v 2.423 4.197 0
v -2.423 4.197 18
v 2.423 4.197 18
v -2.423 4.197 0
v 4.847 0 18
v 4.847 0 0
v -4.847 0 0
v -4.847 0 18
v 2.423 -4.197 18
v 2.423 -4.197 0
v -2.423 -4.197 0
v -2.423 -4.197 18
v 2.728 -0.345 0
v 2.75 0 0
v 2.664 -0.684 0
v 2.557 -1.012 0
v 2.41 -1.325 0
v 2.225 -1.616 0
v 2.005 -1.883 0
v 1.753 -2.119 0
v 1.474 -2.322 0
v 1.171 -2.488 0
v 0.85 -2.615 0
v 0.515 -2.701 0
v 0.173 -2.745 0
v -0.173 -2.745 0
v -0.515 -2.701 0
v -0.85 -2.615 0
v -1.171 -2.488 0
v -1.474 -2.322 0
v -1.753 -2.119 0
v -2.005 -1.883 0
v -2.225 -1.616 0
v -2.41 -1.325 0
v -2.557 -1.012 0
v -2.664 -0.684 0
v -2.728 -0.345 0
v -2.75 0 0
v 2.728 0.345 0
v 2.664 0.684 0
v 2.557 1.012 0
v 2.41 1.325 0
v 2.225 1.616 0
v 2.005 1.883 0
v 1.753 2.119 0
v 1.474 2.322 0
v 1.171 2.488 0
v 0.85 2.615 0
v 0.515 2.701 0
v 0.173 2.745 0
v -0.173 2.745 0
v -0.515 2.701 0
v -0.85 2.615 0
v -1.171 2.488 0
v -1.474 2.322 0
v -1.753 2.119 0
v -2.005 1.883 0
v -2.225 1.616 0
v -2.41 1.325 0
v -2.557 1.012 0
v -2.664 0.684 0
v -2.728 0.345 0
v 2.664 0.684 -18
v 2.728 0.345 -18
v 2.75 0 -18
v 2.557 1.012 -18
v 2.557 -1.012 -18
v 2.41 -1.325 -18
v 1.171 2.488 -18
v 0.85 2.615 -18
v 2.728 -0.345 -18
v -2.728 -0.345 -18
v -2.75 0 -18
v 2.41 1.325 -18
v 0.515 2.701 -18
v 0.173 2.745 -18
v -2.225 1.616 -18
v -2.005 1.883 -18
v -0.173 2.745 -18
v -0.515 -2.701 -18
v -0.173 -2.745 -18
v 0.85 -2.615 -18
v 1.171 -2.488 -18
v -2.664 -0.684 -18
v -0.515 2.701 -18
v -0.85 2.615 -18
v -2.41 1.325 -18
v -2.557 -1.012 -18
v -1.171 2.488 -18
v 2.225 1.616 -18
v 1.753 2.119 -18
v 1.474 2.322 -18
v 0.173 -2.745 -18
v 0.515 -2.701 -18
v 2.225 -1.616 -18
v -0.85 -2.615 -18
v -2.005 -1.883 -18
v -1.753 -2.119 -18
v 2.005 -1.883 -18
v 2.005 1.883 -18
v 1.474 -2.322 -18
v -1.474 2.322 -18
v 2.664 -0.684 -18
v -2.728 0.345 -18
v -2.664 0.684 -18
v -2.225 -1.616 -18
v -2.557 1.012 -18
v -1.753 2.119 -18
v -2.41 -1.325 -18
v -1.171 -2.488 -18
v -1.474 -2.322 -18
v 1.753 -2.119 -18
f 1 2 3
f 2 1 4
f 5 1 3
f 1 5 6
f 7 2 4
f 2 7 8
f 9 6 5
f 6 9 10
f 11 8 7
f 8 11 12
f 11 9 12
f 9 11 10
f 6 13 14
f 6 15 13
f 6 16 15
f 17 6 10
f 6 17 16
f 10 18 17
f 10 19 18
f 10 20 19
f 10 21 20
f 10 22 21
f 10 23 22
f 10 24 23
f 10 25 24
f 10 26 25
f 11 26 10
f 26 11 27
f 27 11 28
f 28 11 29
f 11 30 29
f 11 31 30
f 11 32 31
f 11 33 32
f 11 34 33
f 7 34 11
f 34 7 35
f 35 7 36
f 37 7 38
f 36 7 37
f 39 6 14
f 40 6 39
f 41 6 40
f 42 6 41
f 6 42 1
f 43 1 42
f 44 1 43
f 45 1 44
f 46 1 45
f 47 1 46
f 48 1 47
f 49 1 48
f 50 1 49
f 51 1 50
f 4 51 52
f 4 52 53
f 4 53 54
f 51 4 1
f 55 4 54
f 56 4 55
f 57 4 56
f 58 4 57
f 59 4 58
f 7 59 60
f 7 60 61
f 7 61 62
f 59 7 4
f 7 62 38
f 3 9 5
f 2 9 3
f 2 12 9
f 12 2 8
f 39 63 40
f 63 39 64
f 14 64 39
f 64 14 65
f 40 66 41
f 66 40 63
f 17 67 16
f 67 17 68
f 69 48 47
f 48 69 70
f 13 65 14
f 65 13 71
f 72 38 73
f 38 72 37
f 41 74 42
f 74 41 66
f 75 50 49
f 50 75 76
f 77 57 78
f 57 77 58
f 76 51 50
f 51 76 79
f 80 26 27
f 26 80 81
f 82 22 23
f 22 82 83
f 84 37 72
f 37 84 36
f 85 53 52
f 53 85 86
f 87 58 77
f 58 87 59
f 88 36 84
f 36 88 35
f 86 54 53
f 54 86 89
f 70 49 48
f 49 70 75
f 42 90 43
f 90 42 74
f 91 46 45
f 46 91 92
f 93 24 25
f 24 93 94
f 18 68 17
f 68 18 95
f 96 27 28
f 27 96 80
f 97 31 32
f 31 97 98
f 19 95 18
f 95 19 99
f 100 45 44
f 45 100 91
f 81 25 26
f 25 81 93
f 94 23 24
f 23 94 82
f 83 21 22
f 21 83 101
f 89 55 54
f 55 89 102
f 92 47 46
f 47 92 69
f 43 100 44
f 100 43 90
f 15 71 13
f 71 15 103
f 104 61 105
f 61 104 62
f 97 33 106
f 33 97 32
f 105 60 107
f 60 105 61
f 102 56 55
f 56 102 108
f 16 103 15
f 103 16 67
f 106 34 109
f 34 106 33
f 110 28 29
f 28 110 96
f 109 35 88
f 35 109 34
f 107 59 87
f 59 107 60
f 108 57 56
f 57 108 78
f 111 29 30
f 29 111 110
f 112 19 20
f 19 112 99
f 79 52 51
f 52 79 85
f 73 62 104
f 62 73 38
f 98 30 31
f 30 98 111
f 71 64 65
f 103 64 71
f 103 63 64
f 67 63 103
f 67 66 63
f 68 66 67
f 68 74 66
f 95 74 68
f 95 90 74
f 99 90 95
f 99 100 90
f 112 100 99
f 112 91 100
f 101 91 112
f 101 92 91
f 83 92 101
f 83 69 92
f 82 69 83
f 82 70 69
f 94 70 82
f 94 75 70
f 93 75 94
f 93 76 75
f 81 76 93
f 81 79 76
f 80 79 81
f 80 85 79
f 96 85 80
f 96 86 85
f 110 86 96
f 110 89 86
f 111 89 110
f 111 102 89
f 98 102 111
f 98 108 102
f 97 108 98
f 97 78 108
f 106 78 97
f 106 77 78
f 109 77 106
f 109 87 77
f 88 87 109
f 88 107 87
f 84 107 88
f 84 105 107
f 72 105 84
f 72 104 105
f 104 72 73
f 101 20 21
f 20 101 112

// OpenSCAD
$fn = 50;


difference() {
	union() {
		linear_extrude(height = 18) {
			polygon(points = [[4.8468000000, 0.0000000000], [2.4234000000, 4.1974519271], [-2.4234000000, 4.1974519271], [-4.8468000000, 0.0000000000], [-2.4234000000, -4.1974519271], [2.4234000000, -4.1974519271]]);
		}
		translate(v = [0, 0, -18]) {
			cylinder(h = 18, r = 2.7500000000);
		}
	}
	union();
}
